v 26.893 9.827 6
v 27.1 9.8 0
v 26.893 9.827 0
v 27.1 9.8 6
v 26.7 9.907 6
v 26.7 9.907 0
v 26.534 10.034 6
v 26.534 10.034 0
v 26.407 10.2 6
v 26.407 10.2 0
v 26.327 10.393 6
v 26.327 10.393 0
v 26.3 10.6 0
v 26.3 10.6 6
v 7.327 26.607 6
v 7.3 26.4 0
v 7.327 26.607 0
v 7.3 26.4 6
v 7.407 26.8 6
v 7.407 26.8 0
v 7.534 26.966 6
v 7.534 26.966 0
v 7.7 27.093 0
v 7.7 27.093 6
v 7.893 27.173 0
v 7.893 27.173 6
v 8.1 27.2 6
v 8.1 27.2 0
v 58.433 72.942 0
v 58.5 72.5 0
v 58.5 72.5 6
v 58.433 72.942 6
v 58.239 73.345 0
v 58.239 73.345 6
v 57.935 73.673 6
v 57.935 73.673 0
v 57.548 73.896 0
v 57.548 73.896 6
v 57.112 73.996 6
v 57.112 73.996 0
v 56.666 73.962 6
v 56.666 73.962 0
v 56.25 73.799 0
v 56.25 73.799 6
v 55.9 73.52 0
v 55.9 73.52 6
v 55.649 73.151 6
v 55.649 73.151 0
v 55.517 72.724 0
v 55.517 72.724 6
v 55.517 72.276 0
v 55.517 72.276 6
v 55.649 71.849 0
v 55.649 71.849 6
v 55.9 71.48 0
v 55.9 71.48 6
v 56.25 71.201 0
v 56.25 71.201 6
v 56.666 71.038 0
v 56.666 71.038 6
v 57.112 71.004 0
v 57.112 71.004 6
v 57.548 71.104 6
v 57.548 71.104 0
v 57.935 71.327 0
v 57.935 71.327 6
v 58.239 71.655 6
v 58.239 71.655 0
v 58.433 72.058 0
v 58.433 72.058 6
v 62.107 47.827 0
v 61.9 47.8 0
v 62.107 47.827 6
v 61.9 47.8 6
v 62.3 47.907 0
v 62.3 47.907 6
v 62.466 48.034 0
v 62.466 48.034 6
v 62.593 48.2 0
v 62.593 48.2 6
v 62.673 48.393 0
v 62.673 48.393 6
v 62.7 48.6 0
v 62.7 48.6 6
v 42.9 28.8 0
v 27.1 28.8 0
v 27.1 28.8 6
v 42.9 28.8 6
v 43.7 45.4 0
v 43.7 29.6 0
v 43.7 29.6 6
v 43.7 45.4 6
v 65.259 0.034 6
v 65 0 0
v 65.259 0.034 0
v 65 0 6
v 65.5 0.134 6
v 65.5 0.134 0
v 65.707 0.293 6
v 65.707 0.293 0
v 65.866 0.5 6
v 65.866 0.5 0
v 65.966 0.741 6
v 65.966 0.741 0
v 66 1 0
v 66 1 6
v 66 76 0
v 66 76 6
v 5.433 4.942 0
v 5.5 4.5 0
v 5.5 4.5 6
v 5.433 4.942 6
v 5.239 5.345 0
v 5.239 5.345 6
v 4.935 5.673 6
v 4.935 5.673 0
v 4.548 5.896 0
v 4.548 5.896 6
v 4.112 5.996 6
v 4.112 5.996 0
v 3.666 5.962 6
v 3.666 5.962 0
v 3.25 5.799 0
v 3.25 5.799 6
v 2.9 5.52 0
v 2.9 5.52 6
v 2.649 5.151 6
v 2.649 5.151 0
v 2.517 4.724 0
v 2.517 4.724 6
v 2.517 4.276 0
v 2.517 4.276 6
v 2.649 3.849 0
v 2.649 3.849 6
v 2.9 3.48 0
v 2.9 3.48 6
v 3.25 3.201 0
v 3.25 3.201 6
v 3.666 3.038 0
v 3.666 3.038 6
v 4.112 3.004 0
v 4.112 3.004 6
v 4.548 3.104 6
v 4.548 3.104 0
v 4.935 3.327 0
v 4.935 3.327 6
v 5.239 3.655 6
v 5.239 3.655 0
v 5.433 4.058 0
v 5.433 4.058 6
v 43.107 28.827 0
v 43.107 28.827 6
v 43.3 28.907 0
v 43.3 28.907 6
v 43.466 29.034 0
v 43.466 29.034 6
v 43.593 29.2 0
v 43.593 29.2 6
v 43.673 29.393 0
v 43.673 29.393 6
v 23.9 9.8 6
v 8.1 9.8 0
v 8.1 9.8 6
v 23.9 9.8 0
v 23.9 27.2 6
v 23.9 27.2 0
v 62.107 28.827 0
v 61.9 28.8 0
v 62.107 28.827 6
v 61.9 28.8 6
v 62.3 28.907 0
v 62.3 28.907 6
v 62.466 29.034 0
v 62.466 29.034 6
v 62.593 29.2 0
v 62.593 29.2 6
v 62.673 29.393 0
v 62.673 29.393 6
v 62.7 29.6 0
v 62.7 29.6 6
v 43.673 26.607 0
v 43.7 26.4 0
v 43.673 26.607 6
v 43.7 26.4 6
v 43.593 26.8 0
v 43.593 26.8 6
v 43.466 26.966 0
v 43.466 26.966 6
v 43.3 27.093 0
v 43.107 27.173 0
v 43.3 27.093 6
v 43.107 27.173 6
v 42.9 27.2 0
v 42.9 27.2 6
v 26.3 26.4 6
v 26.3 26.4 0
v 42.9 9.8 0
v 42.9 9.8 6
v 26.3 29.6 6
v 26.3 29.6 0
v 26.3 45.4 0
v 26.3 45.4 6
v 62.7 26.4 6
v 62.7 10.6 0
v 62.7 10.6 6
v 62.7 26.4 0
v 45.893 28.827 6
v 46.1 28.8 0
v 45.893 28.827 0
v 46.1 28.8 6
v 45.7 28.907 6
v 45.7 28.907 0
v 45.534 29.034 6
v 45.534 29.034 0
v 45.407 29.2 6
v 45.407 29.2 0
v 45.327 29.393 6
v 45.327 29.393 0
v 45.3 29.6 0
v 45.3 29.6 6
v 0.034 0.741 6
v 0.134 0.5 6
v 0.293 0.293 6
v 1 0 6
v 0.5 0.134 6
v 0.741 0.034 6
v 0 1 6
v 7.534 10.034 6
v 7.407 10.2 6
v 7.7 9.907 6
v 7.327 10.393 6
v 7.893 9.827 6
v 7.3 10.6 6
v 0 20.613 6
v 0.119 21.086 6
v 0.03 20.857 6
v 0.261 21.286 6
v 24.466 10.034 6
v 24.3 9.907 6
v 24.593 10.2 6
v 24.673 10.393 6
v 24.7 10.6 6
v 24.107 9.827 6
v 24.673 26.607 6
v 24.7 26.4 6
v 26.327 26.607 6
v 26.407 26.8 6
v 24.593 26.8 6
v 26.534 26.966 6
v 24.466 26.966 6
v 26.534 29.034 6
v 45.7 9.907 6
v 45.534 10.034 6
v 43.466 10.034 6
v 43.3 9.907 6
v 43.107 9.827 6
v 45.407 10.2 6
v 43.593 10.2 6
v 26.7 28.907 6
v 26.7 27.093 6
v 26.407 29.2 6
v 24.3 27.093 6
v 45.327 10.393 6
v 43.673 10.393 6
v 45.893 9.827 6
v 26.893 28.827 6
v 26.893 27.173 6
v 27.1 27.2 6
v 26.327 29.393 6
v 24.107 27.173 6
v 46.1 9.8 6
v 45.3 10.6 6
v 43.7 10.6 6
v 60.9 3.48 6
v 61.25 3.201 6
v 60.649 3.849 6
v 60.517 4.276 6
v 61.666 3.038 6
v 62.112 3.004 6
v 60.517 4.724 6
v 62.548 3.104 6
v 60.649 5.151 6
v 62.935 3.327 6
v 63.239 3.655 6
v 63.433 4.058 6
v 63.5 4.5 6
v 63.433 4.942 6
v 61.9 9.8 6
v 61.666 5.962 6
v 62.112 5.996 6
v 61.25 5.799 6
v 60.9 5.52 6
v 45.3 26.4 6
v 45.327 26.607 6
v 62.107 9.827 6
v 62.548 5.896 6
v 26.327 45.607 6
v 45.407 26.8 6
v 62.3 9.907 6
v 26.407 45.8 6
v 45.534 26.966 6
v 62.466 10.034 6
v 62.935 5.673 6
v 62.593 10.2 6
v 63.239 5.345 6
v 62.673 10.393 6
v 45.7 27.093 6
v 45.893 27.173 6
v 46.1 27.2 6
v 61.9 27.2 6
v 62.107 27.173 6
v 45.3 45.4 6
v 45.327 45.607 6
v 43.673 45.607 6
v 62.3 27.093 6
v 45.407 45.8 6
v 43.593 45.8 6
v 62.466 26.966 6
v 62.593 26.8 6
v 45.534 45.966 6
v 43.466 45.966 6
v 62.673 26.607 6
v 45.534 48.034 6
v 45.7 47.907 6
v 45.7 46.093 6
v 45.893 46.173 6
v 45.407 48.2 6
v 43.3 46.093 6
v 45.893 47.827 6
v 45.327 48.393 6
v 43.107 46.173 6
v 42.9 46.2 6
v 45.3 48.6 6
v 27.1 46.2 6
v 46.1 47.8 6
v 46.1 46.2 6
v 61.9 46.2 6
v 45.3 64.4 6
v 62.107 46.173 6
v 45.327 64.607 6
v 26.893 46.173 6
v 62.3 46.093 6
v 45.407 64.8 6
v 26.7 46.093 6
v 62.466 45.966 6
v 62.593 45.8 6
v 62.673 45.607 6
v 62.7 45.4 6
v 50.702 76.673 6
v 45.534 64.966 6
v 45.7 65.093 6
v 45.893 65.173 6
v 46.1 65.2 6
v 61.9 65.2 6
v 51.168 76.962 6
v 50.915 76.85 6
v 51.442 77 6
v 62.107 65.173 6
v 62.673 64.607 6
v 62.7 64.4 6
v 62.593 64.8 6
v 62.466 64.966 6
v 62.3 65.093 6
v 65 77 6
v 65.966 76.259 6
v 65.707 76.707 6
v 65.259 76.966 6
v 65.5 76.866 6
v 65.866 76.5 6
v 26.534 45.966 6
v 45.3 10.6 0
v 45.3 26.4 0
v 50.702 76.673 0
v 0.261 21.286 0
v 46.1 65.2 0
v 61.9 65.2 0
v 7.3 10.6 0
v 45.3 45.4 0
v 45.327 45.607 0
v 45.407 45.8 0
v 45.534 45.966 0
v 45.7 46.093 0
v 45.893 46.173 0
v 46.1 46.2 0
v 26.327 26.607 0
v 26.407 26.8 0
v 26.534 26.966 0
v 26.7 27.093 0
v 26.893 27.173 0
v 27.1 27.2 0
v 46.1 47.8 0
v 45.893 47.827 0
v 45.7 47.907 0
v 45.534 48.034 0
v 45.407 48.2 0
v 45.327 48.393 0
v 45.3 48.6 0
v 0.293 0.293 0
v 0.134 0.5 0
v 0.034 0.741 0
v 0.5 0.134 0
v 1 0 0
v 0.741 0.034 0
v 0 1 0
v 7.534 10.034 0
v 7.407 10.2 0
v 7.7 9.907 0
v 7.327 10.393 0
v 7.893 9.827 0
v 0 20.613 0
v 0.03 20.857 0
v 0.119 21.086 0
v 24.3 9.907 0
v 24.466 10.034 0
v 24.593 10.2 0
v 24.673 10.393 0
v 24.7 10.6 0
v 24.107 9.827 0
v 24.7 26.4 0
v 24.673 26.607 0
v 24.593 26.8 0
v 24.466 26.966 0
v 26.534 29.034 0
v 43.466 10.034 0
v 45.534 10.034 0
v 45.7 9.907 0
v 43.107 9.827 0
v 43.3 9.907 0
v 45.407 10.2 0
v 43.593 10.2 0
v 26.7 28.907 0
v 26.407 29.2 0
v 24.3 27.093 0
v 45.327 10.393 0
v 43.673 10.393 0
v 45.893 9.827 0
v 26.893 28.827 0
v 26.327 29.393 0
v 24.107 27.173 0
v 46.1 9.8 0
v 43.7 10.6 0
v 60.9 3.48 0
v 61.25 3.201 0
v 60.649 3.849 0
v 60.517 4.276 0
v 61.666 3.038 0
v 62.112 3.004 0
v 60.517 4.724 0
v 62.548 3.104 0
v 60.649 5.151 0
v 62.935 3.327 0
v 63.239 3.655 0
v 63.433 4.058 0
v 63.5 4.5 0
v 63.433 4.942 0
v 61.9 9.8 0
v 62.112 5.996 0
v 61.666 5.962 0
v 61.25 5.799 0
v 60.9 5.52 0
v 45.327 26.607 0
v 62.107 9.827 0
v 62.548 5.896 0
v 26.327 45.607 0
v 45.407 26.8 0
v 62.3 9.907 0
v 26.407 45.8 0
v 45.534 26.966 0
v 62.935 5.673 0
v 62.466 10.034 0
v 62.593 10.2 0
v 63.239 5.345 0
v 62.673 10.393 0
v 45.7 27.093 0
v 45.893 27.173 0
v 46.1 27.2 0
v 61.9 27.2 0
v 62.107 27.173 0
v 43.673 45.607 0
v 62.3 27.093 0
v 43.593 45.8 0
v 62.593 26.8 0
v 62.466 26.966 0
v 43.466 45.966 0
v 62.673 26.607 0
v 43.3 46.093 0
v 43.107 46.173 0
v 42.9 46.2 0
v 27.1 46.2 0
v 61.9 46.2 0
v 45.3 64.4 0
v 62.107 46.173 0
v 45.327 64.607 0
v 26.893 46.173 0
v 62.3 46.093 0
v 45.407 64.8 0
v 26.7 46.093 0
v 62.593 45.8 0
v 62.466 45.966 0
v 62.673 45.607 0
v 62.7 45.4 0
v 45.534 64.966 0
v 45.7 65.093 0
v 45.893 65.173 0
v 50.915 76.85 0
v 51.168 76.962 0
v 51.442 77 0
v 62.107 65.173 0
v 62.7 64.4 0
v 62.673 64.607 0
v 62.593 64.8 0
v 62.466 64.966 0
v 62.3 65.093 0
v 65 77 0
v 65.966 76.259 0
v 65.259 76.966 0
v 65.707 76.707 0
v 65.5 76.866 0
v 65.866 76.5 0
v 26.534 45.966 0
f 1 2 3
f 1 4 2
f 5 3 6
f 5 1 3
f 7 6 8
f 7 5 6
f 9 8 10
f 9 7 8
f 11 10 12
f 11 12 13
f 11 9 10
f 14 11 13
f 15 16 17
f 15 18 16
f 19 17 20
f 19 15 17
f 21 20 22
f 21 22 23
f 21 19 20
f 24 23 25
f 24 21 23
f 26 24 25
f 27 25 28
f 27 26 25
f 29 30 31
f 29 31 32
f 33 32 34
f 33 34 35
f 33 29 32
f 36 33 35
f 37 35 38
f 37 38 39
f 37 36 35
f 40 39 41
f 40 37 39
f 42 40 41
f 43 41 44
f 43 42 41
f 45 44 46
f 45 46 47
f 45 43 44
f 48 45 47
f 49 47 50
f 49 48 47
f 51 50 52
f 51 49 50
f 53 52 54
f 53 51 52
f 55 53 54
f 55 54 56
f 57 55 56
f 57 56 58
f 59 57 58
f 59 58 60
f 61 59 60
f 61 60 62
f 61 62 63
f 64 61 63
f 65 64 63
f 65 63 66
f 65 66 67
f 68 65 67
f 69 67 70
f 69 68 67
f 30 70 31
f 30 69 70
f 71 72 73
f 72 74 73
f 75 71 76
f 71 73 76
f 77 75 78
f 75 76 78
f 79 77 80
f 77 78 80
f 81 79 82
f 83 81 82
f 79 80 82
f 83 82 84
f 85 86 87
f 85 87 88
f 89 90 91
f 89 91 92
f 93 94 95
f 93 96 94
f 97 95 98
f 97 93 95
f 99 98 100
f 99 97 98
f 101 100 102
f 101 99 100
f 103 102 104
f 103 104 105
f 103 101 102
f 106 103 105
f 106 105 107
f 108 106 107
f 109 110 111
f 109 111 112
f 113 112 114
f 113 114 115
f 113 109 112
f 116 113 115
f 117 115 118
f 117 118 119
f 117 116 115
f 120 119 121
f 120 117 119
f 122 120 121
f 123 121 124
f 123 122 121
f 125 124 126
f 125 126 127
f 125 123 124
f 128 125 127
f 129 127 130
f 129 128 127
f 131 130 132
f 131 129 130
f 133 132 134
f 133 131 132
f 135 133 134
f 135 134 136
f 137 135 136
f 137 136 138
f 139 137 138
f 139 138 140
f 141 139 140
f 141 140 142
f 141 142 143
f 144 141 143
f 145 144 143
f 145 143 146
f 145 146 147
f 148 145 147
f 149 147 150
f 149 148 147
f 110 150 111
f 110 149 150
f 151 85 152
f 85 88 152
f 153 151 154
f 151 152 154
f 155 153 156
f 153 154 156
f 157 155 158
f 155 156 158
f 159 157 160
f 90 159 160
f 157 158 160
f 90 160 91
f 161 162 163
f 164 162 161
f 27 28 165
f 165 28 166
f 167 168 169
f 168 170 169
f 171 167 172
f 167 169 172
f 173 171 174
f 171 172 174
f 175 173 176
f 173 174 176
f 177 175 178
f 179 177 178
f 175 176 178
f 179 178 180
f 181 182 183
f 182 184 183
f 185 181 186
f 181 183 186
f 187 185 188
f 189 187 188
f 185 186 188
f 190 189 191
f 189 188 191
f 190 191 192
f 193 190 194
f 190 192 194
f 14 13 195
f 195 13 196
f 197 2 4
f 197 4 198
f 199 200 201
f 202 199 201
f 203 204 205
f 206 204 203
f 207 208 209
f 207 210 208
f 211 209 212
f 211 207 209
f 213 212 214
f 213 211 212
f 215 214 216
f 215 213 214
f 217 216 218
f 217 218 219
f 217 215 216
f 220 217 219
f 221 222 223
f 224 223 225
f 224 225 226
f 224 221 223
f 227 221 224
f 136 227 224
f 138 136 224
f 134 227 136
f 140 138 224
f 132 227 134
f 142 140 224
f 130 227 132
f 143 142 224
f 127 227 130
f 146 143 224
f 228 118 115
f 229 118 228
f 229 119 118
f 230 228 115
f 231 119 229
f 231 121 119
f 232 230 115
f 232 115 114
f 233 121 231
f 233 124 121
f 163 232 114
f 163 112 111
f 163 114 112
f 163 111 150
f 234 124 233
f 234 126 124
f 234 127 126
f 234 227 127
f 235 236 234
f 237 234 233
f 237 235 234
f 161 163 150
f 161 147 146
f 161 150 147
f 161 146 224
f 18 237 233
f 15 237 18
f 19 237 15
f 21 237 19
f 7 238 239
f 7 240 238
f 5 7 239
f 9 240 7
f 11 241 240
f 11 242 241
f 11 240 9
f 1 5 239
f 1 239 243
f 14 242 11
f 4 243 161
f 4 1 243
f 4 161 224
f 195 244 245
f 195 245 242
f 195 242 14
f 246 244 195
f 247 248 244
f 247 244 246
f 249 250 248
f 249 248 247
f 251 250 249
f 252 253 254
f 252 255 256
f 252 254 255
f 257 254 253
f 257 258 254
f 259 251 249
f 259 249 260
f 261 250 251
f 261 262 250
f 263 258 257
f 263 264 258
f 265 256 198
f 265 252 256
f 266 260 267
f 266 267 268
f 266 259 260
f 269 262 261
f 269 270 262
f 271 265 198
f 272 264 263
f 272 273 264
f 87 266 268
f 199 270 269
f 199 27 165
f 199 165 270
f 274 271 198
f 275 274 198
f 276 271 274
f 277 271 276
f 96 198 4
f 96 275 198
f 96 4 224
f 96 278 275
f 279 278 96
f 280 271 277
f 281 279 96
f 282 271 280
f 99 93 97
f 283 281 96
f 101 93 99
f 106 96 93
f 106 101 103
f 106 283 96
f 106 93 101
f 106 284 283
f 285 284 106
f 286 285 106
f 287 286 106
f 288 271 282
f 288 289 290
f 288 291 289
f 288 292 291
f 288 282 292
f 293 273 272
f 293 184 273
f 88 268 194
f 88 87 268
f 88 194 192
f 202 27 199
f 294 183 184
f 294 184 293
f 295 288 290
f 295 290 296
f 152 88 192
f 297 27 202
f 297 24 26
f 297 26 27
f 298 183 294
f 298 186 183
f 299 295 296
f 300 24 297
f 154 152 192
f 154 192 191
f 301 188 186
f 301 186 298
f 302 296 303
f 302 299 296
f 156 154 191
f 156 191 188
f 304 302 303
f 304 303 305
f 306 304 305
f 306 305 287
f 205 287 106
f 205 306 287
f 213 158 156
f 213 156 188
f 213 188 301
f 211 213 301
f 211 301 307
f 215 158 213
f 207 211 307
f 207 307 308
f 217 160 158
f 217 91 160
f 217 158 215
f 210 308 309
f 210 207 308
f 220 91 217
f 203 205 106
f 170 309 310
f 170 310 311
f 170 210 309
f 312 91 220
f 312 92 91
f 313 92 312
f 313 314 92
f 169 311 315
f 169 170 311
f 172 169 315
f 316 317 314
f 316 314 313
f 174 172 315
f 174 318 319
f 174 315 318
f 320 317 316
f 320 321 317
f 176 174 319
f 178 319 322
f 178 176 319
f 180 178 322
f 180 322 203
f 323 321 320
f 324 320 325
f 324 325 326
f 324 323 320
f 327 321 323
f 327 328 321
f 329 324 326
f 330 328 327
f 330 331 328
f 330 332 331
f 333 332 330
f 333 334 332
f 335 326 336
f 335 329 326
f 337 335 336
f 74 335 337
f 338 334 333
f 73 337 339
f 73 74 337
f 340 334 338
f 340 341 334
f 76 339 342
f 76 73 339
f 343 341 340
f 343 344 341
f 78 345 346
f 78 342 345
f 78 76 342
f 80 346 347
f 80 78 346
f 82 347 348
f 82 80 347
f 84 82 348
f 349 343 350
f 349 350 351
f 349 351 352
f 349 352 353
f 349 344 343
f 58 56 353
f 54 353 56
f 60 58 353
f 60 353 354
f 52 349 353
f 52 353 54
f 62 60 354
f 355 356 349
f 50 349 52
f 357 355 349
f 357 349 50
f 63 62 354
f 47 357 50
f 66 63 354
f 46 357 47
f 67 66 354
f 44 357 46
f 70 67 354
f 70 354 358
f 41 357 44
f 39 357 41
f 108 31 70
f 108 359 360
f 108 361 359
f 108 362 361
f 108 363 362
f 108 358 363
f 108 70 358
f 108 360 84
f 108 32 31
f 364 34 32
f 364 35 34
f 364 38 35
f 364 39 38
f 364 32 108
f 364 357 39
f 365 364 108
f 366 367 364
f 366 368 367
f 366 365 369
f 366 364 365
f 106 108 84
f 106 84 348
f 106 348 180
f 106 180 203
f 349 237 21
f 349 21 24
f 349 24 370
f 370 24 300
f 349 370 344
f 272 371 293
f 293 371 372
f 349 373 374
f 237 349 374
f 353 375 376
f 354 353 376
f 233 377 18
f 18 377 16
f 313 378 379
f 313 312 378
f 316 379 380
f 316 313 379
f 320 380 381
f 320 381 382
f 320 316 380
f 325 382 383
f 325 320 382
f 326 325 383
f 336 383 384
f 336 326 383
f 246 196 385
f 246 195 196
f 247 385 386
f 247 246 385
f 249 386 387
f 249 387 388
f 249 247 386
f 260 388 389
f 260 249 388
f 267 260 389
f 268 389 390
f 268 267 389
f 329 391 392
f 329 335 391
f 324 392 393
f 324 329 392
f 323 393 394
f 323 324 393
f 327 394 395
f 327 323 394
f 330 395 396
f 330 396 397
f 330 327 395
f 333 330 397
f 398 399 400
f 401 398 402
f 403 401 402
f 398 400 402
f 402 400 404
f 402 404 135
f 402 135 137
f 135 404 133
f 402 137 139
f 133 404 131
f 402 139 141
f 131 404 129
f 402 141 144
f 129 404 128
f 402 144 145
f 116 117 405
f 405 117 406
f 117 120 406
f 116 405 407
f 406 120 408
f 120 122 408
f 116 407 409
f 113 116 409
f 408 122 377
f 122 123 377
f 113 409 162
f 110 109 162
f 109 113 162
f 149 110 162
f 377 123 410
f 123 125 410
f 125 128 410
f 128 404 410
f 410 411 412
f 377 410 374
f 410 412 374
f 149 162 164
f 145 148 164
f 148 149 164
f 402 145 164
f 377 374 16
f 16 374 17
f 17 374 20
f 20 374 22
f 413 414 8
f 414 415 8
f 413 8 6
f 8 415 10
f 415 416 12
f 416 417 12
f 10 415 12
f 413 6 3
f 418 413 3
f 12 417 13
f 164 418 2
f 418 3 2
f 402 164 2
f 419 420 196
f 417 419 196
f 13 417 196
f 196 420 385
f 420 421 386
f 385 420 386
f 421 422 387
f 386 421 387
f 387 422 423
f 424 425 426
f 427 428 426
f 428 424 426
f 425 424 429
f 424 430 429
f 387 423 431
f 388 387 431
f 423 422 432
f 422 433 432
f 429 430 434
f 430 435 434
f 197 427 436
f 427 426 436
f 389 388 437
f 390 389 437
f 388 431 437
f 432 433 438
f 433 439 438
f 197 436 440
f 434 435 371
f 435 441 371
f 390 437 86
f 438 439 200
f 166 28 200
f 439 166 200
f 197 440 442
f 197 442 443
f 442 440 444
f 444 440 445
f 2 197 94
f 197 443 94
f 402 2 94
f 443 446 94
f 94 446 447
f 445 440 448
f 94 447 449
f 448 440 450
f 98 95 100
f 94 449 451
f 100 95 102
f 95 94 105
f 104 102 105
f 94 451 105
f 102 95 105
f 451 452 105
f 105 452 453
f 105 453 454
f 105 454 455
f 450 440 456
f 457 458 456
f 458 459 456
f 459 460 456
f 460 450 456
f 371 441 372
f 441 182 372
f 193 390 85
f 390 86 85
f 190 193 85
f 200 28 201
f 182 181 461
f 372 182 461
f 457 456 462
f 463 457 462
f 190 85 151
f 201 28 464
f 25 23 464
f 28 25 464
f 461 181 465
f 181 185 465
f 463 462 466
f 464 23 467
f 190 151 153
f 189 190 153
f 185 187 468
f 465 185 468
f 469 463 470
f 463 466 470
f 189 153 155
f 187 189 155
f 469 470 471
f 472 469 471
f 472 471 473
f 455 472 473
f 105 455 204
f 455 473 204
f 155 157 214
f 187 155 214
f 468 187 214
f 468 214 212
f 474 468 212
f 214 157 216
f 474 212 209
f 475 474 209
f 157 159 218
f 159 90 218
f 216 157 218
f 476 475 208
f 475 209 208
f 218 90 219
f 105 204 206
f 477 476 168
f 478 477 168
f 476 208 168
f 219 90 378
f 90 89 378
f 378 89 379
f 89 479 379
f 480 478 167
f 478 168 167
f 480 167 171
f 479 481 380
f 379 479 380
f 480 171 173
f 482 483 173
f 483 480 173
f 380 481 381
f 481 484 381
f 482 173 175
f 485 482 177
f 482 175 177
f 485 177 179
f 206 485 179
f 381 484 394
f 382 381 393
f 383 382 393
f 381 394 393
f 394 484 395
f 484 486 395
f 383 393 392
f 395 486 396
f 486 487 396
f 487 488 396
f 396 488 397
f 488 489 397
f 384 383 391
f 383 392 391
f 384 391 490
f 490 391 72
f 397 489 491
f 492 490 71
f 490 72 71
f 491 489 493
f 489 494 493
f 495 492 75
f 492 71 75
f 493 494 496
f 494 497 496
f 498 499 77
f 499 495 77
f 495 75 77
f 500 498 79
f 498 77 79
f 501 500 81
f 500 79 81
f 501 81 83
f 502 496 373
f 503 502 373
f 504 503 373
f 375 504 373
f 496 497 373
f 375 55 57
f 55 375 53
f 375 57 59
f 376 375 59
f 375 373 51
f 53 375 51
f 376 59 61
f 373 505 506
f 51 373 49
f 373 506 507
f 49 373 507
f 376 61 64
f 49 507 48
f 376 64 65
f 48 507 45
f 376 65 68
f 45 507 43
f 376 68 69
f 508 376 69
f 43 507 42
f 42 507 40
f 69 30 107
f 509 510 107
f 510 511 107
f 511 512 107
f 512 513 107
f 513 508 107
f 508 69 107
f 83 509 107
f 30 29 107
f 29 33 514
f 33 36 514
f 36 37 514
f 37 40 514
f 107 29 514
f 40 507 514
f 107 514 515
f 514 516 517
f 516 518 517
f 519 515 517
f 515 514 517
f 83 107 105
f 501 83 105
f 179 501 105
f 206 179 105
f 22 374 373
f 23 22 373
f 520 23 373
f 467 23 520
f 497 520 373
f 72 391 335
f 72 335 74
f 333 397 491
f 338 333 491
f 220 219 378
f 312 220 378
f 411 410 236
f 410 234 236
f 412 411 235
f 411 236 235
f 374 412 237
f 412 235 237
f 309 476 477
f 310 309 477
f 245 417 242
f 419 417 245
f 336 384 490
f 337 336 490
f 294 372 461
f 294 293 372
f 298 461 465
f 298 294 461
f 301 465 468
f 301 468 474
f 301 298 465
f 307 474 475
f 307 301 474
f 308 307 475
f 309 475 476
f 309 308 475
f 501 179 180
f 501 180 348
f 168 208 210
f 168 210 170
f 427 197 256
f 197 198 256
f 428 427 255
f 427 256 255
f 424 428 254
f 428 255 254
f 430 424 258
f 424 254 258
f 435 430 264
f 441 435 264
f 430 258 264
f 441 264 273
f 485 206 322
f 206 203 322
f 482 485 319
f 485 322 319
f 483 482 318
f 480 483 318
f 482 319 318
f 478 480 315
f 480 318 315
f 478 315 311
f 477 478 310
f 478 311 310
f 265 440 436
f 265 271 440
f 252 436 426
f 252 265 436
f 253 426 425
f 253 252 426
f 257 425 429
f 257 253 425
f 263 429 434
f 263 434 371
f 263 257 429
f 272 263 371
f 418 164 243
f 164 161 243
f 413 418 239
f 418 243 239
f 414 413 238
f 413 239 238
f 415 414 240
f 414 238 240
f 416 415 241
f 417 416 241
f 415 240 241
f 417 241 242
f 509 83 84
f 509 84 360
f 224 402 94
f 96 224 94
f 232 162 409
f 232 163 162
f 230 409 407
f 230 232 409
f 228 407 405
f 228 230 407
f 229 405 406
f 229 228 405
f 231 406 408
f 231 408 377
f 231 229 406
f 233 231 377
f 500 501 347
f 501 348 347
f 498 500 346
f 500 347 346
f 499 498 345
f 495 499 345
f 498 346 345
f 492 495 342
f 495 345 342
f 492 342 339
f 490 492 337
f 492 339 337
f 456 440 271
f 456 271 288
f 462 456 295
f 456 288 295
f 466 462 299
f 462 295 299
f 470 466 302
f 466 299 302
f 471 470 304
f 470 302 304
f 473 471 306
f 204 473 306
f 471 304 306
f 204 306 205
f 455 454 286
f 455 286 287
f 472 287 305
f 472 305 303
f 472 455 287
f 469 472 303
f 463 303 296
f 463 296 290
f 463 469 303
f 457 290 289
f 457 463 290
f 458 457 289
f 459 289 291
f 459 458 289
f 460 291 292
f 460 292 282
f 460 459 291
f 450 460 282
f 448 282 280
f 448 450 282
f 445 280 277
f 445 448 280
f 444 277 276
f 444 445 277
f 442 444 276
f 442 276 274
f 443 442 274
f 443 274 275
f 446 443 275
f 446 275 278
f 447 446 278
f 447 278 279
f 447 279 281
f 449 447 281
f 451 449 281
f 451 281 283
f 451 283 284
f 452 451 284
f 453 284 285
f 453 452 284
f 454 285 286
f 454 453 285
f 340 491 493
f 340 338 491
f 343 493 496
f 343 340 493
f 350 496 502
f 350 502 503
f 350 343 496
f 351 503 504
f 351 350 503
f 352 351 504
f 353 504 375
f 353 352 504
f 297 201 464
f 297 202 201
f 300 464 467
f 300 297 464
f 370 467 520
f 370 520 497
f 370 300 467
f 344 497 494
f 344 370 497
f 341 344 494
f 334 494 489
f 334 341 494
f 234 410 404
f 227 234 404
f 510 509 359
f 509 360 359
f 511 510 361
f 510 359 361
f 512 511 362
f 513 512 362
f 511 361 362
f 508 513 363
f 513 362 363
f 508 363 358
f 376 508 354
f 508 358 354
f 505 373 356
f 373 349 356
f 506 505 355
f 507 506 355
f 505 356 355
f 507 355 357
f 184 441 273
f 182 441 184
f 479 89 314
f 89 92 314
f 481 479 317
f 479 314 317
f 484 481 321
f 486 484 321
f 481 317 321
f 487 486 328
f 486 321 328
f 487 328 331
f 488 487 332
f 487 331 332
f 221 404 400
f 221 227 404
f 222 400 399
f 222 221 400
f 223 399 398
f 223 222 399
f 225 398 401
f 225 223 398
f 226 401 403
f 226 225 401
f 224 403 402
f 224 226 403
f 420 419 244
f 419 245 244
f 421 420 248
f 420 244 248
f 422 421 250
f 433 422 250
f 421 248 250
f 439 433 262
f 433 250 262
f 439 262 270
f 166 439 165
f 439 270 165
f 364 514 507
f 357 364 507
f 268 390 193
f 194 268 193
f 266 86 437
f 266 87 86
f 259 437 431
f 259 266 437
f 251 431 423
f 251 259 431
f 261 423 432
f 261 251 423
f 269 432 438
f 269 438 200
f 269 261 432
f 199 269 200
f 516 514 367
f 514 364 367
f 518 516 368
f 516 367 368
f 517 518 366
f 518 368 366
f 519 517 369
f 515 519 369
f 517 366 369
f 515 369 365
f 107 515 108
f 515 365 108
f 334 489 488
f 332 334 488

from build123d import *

# Parameters (mm, degrees)
F0_R     = 1.5
F0_W     = 17.4
F0_H     = 17.4
F1_DEPTH = 6
F2_R     = 0.8
F3_R     = 1


with BuildPart() as f1:
    # F0 (on Top) → F1 (new body)
    with BuildSketch(Plane.XY):
        Polygon((0, 21), (0, 0), (66, 0), (66, 77), (51, 77), align=None)
        with Locations((4, 4.5)):
            Circle(F0_R, mode=Mode.SUBTRACT)
        with Locations((16, 18.5)):
            Rectangle(F0_W, F0_H, mode=Mode.SUBTRACT)
        with Locations((35, 18.5)):
            Rectangle(F0_W, F0_H, mode=Mode.SUBTRACT)
        with Locations((62, 4.5)):
            Circle(F0_R, mode=Mode.SUBTRACT)
        with Locations((54, 18.5)):
            Rectangle(F0_W, F0_H, mode=Mode.SUBTRACT)
        with Locations((35, 37.5)):
            Rectangle(F0_W, F0_H, mode=Mode.SUBTRACT)
        with Locations((54, 37.5)):
            Rectangle(F0_W, F0_H, mode=Mode.SUBTRACT)
        with Locations((54, 56.5)):
            Rectangle(F0_W, F0_H, mode=Mode.SUBTRACT)
        with Locations((57, 72.5)):
            Circle(F0_R, mode=Mode.SUBTRACT)
    extrude(amount=F1_DEPTH)

    # F2
    f2_edges = [f1.edges().sort_by_distance(p)[0] for p in [
        (7.3, 27.2, 3),
        (26.3, 27.2, 3),
        (45.3, 27.2, 3),
        (26.3, 46.2, 3),
        (45.3, 46.2, 3),
        (45.3, 65.2, 3),
        (62.7, 65.2, 3),
        (62.7, 46.2, 3),
        (62.7, 27.2, 3),
        (43.7, 46.2, 3),
        (43.7, 27.2, 3),
        (24.7, 27.2, 3),
        (62.7, 47.8, 3),
        (62.7, 28.8, 3),
        (62.7, 9.8, 3),
        (43.7, 9.8, 3),
        (24.7, 9.8, 3),
        (43.7, 28.8, 3),
        (26.3, 28.8, 3),
        (26.3, 9.8, 3),
        (7.3, 9.8, 3),
        (45.3, 9.8, 3),
        (45.3, 28.8, 3),
        (45.3, 47.8, 3),
    ]]
    fillet(f2_edges, radius=F2_R)

    # F3
    f3_edges = [f1.edges().sort_by_distance(p)[0] for p in [
        (66, 77, 3),
        (51, 77, 3),
        (0, 21, 3),
        (0, 0, 3),
        (66, 0, 3),
    ]]
    fillet(f3_edges, radius=F3_R)


solid = f1.part
